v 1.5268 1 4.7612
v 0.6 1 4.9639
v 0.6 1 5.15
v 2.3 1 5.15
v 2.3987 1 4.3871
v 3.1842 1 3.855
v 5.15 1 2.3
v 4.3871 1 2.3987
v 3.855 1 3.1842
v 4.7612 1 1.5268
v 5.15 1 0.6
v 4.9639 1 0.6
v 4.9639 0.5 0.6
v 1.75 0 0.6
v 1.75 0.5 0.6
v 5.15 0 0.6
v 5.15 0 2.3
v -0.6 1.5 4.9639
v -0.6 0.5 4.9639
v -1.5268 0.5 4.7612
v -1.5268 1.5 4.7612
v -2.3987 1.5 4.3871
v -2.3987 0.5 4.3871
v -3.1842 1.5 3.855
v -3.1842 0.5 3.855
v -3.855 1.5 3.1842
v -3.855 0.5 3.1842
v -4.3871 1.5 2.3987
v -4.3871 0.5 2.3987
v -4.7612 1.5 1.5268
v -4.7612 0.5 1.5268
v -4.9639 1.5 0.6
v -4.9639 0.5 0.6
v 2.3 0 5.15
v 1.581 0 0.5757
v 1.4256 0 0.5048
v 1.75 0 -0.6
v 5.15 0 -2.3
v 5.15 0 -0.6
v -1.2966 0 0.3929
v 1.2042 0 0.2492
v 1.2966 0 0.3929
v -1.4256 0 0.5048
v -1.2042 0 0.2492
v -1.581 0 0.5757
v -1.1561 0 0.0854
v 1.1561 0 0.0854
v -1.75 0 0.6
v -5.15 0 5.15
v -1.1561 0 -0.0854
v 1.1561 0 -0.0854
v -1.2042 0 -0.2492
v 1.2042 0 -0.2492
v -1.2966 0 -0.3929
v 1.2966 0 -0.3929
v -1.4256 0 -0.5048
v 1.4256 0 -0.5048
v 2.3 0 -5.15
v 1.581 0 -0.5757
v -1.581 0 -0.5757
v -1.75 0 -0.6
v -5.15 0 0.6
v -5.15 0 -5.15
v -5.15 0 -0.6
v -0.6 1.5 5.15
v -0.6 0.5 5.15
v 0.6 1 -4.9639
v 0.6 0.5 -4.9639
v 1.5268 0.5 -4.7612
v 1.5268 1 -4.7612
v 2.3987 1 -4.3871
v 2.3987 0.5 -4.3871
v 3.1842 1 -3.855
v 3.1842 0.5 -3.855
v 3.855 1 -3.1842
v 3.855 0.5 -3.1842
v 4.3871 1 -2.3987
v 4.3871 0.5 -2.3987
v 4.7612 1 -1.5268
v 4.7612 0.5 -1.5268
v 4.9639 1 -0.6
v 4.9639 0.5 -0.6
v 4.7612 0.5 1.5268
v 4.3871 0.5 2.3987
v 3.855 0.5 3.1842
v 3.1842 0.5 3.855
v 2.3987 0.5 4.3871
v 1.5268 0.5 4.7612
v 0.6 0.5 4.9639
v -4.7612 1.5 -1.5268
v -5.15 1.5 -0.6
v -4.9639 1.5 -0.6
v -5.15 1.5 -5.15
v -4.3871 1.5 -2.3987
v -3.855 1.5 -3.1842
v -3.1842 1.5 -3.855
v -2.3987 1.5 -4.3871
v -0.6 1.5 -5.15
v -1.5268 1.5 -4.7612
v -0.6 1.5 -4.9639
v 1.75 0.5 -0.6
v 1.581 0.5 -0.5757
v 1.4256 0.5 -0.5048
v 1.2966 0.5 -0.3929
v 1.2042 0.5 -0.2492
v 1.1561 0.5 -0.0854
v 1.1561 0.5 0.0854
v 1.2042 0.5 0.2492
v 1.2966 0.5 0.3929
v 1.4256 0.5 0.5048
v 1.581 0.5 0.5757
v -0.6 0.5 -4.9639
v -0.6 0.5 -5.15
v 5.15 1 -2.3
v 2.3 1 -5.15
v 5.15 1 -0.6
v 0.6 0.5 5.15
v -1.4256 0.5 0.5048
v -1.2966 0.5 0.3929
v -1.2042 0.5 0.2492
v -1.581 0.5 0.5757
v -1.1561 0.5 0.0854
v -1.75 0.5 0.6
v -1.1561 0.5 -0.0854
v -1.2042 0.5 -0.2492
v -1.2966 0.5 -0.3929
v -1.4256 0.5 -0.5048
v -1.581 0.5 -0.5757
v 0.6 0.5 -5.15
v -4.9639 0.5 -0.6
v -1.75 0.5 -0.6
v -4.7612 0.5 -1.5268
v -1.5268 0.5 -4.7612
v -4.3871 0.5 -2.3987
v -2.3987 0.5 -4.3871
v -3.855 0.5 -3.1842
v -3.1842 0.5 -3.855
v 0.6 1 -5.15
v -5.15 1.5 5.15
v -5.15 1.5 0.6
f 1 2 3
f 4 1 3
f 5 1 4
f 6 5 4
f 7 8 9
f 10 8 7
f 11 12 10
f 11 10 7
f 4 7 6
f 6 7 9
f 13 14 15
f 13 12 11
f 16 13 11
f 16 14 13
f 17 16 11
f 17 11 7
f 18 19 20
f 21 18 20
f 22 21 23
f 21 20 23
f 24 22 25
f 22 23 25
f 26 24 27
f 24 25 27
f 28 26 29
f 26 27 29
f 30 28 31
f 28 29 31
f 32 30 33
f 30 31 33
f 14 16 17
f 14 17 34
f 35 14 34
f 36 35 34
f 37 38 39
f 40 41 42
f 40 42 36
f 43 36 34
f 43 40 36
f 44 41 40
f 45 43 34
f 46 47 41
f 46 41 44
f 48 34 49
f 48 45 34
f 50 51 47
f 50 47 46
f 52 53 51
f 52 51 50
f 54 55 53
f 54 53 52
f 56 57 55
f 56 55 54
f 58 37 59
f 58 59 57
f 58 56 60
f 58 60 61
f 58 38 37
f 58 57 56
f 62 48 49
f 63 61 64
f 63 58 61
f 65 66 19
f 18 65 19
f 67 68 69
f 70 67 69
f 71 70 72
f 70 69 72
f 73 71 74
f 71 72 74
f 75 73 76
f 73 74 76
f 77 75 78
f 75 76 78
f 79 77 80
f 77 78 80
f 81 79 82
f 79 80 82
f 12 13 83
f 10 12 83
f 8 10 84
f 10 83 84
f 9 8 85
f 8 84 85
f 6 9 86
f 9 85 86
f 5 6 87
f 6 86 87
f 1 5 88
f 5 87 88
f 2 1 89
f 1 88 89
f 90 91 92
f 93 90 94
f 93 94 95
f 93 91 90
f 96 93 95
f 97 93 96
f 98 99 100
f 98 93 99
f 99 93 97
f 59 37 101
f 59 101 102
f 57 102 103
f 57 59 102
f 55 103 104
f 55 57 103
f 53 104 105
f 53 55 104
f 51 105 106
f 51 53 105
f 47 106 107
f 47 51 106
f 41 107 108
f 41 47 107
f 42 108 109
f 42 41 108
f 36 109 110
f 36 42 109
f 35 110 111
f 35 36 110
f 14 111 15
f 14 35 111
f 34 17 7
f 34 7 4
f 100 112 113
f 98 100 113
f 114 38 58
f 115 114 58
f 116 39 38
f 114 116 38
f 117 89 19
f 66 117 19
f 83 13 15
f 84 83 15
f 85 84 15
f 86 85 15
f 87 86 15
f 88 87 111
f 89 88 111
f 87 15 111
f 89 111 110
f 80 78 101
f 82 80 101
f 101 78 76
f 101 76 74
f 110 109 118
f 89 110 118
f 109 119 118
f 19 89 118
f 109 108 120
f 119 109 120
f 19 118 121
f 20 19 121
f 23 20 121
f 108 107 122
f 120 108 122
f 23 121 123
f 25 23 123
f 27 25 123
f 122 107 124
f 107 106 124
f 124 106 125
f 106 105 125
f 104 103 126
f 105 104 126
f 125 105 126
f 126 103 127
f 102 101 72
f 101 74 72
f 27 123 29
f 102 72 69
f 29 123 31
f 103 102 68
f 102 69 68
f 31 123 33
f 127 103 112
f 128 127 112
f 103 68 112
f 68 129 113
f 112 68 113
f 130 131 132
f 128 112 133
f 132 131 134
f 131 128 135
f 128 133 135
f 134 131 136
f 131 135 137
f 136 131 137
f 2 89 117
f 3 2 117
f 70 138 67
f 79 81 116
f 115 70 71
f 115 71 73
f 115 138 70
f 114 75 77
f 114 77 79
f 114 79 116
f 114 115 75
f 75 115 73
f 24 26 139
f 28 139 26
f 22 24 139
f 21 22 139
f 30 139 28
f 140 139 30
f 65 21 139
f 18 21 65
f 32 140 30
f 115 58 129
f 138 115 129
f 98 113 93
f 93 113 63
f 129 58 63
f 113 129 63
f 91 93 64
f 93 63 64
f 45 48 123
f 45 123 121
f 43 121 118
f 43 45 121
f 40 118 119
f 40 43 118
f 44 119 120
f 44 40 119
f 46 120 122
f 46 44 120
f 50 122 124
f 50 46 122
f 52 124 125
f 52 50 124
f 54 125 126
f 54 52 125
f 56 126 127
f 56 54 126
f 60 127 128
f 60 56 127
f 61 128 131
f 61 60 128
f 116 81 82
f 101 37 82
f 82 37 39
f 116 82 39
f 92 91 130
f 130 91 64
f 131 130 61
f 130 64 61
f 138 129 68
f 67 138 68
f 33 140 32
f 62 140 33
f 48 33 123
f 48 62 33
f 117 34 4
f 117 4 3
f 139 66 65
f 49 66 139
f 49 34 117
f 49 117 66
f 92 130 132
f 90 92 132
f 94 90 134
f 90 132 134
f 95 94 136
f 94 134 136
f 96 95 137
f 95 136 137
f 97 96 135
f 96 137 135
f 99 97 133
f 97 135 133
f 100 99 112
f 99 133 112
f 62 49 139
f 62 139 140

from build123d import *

# Parameters (mm, degrees)
BASE_DEPTH         = 0.5
BACK_HEIGHT_DEPTH  = 1
FRONT_HEIGHT_DEPTH = 0.5


with BuildPart() as part:
    # Sketch1 → Base (new body)
    with BuildSketch(Plane(origin=(0, 0, 0), x_dir=(1, 0, 0), z_dir=(0, 1, 0))):
        with BuildLine():
            Line((2.3, 5.15), (5.15, 2.3))
            Line((5.15, 2.3), (5.15, 0.6))
            Line((5.15, 0.6), (1.75, 0.6))
            ThreePointArc((1.75, 0.6), (1.15, 0), (1.75, -0.6))
            Line((1.75, -0.6), (5.15, -0.6))
            Line((5.15, -0.6), (5.15, -2.3))
            Line((5.15, -2.3), (2.3, -5.15))
            Line((2.3, -5.15), (-5.15, -5.15))
            Line((-5.15, -5.15), (-5.15, -0.6))
            Line((-5.15, -0.6), (-1.75, -0.6))
            ThreePointArc((-1.75, -0.6), (-1.15, 0), (-1.75, 0.6))
            Line((-1.75, 0.6), (-5.15, 0.6))
            Line((-5.15, 0.6), (-5.15, 5.15))
            Line((-5.15, 5.15), (2.3, 5.15))
        make_face()
    extrude(amount=BASE_DEPTH)

    # Sketch2 → Back Height (add)
    with BuildSketch(Plane(origin=(0, 0.5, 0), x_dir=(1, 0, 0), z_dir=(0, 1, 0))):
        with BuildLine():
            Line((-0.6, 4.963869458), (-0.6, 5.15))
            Line((-0.6, 5.15), (-5.15, 5.15))
            Line((-5.15, 5.15), (-5.15, 0.6))
            Line((-5.15, 0.6), (-4.963869458, 0.6))
            ThreePointArc((-4.963869458, 0.6), (-3.535533906, 3.535533906), (-0.6, 4.963869458))
        make_face()
        with BuildLine():
            ThreePointArc((-0.6, -4.963869458), (-3.535533906, -3.535533906), (-4.963869458, -0.6))
            Line((-4.963869458, -0.6), (-5.15, -0.6))
            Line((-5.15, -0.6), (-5.15, -5.15))
            Line((-5.15, -5.15), (-0.6, -5.15))
            Line((-0.6, -5.15), (-0.6, -4.963869458))
        make_face()
    extrude(amount=BACK_HEIGHT_DEPTH)

    # Sketch2<3> → Front Height (add)
    with BuildSketch(Plane(origin=(0, 0.5, 0), x_dir=(1, 0, 0), z_dir=(0, 1, 0))):
        with BuildLine():
            Line((2.3, 5.15), (0.6, 5.15))
            Line((0.6, 5.15), (0.6, 4.963869458))
            ThreePointArc((0.6, 4.963869458), (3.535533906, 3.535533906), (4.963869458, 0.6))
            Line((4.963869458, 0.6), (5.15, 0.6))
            Line((5.15, 0.6), (5.15, 2.3))
            Line((5.15, 2.3), (2.3, 5.15))
        make_face()
        with BuildLine():
            Line((5.15, -0.6), (4.963869458, -0.6))
            ThreePointArc((4.963869458, -0.6), (3.535533906, -3.535533906), (0.6, -4.963869458))
            Line((0.6, -4.963869458), (0.6, -5.15))
            Line((0.6, -5.15), (2.3, -5.15))
            Line((2.3, -5.15), (5.15, -2.3))
            Line((5.15, -2.3), (5.15, -0.6))
        make_face()
    extrude(amount=FRONT_HEIGHT_DEPTH)


solid = part.part
